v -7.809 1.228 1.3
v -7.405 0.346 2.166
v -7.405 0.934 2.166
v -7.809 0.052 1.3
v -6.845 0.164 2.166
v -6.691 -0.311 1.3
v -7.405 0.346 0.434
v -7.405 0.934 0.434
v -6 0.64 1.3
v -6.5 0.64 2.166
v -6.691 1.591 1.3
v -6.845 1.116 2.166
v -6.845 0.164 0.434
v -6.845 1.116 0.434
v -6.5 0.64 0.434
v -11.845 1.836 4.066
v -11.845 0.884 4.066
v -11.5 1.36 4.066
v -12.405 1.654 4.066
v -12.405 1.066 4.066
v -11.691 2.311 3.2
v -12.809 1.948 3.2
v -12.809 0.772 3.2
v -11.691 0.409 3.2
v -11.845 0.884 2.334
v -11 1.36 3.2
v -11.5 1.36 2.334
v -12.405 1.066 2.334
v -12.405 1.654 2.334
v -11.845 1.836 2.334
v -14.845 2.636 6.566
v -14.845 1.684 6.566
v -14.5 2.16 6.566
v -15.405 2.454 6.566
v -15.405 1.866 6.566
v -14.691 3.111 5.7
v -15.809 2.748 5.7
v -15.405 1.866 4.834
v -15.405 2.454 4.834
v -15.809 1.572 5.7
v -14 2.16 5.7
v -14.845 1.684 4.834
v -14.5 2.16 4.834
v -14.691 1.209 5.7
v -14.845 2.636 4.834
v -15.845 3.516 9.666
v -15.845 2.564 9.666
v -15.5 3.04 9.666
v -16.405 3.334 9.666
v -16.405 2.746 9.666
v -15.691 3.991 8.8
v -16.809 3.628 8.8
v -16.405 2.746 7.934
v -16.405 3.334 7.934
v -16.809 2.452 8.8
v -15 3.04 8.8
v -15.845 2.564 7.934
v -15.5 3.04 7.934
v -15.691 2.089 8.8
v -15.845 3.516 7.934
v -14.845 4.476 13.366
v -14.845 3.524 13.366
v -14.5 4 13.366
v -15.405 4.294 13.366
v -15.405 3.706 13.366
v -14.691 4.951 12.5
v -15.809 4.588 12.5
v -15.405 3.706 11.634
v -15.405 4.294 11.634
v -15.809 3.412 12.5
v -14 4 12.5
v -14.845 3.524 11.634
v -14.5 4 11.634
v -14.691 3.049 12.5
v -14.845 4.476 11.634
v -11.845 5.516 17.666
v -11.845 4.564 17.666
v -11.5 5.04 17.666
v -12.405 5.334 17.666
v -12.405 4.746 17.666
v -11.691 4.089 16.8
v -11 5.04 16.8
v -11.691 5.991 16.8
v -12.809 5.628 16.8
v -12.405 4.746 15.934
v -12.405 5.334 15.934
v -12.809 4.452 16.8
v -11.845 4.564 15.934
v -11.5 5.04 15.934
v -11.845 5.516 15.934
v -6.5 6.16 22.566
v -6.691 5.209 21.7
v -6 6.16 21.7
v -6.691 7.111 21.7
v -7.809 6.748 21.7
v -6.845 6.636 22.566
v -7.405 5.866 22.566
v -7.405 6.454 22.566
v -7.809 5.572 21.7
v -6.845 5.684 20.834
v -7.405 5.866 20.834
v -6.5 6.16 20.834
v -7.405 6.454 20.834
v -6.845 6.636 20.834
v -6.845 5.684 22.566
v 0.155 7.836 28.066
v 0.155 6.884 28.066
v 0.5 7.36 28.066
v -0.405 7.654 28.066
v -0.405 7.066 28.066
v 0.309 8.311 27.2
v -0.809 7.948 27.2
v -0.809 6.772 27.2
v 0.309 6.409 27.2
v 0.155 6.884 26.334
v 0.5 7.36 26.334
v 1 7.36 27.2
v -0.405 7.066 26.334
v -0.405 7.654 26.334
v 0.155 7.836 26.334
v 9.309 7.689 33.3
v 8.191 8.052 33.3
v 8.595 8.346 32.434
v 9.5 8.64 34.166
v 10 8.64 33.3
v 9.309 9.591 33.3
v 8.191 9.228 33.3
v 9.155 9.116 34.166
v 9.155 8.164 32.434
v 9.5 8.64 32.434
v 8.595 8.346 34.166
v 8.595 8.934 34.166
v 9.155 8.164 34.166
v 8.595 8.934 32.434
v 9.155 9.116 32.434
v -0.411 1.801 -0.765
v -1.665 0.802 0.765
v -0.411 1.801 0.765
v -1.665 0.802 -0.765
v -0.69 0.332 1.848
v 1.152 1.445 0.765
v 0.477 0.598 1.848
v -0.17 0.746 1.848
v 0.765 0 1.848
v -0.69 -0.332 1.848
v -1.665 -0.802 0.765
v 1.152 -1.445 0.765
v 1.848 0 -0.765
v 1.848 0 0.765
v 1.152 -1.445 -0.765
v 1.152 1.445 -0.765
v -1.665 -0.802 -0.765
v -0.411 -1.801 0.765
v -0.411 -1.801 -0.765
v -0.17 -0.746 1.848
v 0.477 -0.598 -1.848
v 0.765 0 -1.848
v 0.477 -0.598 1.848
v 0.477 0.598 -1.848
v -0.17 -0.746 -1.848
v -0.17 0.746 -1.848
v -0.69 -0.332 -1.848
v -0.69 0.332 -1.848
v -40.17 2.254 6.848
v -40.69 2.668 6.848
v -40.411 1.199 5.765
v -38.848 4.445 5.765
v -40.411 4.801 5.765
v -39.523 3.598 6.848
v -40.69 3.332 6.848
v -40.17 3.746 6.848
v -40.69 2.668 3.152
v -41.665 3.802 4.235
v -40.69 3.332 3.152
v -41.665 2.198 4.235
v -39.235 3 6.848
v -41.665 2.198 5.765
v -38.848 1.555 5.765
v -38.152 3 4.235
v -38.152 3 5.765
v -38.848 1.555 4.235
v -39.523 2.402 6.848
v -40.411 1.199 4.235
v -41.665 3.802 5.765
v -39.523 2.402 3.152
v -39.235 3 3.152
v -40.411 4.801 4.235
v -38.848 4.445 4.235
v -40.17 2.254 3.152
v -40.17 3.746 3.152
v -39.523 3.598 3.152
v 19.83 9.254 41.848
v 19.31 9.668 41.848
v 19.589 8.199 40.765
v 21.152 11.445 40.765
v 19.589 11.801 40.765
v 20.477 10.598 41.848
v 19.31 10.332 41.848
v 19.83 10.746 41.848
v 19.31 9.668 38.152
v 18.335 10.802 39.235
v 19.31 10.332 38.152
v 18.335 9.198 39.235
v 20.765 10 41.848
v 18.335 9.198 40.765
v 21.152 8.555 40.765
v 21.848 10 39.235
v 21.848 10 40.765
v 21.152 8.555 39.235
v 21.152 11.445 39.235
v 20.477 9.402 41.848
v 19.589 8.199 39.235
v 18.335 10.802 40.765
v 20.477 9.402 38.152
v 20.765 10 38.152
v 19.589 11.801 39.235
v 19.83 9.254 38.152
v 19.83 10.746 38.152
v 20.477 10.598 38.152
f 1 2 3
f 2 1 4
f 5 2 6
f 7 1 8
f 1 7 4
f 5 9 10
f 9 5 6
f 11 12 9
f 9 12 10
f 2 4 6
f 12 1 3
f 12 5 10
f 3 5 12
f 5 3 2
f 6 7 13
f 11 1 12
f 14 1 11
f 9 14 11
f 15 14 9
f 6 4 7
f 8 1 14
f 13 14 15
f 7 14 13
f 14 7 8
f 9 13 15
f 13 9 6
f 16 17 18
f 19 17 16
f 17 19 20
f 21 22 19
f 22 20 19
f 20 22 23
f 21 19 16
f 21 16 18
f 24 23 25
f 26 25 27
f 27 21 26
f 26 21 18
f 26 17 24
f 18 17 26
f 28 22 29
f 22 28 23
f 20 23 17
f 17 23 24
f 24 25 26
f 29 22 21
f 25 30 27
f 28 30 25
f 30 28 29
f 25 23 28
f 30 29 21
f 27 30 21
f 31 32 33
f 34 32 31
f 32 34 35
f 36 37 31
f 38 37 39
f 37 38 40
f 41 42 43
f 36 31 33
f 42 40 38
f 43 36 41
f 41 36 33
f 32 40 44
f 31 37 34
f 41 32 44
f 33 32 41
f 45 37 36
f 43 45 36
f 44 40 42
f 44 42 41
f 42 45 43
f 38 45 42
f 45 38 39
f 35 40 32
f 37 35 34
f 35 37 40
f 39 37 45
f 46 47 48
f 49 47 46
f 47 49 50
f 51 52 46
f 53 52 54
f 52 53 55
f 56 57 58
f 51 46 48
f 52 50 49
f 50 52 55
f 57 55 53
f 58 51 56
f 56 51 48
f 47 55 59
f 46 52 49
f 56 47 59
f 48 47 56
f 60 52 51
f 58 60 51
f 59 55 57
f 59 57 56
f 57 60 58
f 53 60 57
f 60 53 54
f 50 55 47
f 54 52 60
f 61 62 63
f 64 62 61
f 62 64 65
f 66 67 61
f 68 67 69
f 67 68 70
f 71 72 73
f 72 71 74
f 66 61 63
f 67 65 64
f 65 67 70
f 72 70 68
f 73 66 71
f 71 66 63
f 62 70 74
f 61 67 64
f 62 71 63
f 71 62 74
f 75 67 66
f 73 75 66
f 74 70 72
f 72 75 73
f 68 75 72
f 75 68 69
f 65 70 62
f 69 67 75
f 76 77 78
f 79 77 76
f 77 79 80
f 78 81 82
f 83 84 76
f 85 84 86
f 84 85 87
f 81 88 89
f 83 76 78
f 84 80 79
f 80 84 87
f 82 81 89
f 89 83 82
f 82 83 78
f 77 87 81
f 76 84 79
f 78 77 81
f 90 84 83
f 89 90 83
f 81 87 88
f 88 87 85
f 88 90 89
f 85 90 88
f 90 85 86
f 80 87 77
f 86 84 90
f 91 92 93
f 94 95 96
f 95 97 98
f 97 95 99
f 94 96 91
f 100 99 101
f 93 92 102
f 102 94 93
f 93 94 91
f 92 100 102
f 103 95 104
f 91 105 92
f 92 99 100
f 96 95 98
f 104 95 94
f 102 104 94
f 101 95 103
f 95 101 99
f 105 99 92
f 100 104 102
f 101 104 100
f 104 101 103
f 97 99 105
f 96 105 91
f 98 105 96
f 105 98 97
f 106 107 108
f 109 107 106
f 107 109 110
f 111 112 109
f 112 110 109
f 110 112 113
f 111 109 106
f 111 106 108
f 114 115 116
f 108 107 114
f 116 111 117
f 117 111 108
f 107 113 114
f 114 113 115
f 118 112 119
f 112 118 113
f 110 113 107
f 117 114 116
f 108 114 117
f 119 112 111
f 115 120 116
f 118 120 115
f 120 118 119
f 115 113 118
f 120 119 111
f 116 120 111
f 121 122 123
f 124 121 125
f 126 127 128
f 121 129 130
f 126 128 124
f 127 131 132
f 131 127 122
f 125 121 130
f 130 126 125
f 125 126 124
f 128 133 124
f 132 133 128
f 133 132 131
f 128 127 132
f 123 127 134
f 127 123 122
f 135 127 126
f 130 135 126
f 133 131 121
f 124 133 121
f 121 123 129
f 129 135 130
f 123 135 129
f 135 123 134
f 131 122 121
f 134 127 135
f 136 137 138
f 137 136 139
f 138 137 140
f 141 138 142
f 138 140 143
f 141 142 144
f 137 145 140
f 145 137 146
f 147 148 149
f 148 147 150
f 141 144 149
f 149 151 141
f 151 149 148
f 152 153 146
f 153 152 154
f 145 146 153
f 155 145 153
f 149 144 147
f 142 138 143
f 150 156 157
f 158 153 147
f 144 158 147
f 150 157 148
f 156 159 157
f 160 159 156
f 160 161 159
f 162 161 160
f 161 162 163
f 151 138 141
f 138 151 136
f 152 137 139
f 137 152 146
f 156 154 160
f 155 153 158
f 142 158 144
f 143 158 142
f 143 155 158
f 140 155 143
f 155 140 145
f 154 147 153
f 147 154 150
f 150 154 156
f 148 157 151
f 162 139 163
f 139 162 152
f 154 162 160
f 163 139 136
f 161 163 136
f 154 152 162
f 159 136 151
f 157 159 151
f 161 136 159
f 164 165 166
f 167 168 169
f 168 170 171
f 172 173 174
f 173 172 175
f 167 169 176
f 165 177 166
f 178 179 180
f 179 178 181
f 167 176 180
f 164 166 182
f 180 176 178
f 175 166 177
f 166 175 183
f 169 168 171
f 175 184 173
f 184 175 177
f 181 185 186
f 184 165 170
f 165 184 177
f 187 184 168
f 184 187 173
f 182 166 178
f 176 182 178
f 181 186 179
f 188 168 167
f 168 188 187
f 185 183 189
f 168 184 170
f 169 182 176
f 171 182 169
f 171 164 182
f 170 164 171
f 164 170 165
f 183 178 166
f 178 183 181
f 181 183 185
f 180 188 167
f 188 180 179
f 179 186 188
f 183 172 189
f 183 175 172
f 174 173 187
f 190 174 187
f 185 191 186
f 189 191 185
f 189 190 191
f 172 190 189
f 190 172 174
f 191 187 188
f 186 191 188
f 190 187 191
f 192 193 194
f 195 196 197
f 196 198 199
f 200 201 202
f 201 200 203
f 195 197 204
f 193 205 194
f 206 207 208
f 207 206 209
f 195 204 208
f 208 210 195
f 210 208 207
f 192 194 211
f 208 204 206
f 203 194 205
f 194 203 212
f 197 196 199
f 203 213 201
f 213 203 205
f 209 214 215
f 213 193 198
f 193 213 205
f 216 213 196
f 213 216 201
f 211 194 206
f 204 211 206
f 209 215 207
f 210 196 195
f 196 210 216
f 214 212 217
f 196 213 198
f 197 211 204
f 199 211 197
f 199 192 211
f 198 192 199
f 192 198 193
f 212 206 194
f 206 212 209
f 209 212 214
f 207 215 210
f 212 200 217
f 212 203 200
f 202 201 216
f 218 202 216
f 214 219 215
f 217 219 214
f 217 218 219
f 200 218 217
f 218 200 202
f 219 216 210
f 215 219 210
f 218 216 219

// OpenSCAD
//Buizer curve 3D
//Pascal's triangle 

resolution=0.1;

control_p=[-40,3,5];

p=[[0,0,0],control_p,[20,10,40]];

//Bezier curve
function bezier_curve(p1,p2,t)=
     let(p=(1-t)*[p1.x,p1.y,p1.z]+(t)*[p2.x,p2.y,p2.z])
     [p.x,p.y,p.z];
//--------------------------------------

//main-------------------
function pascal(p,t)=
        pascal_inner(p,len(p),t);
//-----------------------


function pascal_inner(p,n,t)=
let(sum_p=[for(i=[0:n-2])
       bezier_curve(p[i],p[i+1],t)])
n>2? 
pascal_inner(sum_p,n-1,t):
sum_p[0];


for(t=[0:resolution:1])
translate(pascal(p,t))
    sphere(1);





// show the points-------------------------------
for(i=p)
    color("red")
    translate(i)
    sphere(2);
//----------------------------------------------
